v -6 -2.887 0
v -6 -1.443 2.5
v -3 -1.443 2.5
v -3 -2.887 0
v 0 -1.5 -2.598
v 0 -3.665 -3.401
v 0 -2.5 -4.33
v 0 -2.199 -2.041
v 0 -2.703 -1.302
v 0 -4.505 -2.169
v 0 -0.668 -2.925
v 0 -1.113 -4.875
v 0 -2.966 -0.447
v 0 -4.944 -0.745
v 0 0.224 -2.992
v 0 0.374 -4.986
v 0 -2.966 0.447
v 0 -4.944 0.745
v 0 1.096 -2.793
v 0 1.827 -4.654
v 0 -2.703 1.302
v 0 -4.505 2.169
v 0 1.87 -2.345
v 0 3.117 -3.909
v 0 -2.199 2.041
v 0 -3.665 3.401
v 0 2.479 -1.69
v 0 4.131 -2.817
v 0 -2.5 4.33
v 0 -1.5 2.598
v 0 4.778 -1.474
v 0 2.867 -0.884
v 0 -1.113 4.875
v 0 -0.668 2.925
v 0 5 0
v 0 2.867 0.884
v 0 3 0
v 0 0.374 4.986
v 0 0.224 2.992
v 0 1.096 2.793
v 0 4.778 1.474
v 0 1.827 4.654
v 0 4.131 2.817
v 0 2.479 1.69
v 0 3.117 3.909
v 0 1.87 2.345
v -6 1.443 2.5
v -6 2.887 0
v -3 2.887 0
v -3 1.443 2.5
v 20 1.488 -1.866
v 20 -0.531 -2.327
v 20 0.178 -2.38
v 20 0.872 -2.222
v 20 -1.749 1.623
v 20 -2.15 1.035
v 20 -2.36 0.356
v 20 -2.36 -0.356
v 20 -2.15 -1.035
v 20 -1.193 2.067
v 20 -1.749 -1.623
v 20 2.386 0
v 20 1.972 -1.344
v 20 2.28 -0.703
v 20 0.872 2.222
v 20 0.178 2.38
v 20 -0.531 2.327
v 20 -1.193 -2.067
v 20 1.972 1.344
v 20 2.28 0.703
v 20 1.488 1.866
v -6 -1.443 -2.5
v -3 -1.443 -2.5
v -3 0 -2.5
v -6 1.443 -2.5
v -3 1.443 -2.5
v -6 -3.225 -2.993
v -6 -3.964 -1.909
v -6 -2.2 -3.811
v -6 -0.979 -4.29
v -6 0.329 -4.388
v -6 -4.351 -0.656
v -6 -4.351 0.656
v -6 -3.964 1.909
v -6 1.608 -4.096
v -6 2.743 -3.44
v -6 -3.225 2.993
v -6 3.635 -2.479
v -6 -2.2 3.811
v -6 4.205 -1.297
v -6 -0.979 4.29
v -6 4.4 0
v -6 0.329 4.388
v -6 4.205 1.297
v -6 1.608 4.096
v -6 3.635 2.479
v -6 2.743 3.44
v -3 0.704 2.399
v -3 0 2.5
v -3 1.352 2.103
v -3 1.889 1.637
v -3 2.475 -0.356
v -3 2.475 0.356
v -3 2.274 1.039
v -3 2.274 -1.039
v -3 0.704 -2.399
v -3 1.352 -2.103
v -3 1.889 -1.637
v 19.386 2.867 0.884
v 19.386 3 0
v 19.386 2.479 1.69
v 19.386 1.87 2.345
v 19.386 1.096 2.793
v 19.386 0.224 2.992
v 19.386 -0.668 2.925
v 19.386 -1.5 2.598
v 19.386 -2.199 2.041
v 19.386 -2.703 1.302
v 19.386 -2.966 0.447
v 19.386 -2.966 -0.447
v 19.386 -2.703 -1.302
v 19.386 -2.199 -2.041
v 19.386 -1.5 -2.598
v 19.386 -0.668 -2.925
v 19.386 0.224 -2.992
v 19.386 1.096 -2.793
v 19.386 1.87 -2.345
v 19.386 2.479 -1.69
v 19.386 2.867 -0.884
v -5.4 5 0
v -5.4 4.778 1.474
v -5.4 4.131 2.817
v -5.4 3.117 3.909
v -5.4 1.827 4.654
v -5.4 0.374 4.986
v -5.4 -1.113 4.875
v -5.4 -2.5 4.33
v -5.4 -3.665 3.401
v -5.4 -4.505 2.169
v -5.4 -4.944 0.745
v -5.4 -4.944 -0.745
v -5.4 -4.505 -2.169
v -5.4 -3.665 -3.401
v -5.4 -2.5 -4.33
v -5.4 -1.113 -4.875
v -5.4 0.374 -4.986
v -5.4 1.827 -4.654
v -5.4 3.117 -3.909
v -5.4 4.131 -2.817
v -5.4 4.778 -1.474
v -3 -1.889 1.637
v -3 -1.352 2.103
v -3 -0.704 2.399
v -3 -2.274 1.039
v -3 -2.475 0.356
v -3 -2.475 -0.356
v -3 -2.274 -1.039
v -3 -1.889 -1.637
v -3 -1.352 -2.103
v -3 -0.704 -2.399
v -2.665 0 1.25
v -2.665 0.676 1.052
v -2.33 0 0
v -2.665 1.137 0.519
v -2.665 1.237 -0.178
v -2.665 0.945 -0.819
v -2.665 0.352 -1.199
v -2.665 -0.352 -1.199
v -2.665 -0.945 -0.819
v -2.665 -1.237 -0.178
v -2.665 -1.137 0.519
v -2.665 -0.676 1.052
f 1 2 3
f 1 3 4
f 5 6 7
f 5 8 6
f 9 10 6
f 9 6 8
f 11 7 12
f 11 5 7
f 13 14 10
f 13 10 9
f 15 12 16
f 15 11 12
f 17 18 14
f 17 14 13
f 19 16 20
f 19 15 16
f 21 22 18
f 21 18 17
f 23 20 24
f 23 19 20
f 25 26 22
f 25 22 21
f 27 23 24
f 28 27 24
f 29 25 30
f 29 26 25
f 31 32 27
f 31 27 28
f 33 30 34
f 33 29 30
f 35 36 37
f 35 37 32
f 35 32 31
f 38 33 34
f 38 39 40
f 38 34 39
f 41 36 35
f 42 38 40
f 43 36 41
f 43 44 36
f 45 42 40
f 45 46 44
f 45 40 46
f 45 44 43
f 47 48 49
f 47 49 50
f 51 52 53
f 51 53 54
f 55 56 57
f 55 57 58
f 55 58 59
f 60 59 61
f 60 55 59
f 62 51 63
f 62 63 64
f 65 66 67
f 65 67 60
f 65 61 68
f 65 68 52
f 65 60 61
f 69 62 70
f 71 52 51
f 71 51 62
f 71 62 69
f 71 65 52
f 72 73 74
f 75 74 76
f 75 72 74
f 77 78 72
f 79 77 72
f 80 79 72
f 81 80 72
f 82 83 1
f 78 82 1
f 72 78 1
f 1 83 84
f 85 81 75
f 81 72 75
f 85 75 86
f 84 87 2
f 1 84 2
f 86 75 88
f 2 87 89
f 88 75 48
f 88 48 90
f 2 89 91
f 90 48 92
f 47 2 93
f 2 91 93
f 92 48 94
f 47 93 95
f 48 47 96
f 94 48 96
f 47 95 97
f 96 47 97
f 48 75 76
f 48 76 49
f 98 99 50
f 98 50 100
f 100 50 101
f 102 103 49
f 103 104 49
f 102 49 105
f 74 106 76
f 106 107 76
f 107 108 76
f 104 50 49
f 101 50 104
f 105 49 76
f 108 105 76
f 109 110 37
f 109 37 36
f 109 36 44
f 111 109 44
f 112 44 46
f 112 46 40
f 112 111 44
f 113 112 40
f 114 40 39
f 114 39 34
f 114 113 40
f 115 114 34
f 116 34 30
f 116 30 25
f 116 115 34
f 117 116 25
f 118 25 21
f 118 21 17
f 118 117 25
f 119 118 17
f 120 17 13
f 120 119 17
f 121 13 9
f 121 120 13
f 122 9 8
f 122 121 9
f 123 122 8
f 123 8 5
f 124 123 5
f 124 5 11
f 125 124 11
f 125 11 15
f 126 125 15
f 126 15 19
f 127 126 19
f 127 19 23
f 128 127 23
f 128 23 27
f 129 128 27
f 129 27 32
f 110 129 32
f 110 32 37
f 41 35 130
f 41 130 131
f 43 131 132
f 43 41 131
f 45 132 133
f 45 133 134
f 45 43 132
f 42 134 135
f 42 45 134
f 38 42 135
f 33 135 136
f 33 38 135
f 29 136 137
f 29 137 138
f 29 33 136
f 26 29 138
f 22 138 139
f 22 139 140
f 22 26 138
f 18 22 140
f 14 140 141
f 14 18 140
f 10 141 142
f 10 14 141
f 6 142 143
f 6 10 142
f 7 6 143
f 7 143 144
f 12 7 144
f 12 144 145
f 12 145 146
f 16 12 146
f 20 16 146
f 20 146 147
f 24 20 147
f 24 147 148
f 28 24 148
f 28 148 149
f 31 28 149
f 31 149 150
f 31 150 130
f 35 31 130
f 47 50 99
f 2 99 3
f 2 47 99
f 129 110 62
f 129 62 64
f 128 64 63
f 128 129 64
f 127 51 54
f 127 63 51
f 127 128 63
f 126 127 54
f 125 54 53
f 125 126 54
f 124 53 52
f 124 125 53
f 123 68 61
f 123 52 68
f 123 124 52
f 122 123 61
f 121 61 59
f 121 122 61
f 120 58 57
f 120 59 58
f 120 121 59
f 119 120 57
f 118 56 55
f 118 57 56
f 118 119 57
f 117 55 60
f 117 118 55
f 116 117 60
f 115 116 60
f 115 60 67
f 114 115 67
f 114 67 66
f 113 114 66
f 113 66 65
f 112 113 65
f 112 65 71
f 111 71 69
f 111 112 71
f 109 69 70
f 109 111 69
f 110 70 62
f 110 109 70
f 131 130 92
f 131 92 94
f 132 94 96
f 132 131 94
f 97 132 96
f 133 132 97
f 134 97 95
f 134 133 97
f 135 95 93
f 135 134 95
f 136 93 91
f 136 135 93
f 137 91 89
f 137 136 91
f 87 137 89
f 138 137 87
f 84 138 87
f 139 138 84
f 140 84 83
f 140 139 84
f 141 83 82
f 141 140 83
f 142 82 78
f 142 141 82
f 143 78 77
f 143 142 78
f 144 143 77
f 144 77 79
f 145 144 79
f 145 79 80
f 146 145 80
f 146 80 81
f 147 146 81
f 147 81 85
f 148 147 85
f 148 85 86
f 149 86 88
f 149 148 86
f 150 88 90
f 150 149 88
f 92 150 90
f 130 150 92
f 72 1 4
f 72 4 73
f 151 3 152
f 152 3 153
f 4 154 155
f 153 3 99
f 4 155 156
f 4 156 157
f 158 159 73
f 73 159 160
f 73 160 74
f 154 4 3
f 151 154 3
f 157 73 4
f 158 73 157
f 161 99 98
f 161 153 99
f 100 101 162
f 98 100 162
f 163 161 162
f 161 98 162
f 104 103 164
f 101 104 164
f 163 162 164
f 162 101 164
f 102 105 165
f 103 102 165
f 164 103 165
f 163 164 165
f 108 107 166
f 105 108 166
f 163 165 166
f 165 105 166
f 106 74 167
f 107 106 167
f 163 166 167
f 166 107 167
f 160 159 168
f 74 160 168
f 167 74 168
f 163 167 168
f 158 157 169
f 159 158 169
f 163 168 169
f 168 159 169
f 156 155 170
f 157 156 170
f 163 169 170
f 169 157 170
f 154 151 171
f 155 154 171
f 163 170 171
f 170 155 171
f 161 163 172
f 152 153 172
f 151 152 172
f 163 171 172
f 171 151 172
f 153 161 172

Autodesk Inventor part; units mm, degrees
sketch "Sketch_1" plane through (0, 0, 0) normal (0, 0, 1) x (1, 0, 0)
  line L0 (20, 0) -> (-6, 0)
  line L1 (-6, 0) -> (-6, 4.4)
  line L2 (-6, 4.4) -> (-5.4, 5)
  line L3 (-5.4, 5) -> (0, 5)
  line L4 (0, 5) -> (0, 3)
  line L5 (0, 3) -> (19.3865, 3)
  line L6 (19.3865, 3) -> (20, 2.3865)
  line L7 (20, 2.3865) -> (20, 0)
  line L8 (20, 0) -> (-6, 0)
revolve "Revolution1" add sketch "Sketch_1" angle 360 about axis through (20, 0, 0) along (1, 0, 0)
thread "Thread1" size "M6x1" class "6g" standard "ISO Metric profile" length 18.3865
sketch "Sketch2" plane through (-6, 0, 0) normal (-1, 0, 0) x (0, 0, 1)
  point P0 (0, 0)
hole "Hole1" at (-6, 0, 0) direction (1, 0, 0) diameter 5 depth 3 tip angle 150
sketch "Sketch_3" plane through (-6, 0, 0) normal (1, 0, 0) x (0, 0, -1)
  line L0 (-2.5, -1.4434) -> (0, -2.8868)
  line L1 (0, -2.8868) -> (2.5, -1.4434)
  line L2 (2.5, -1.4434) -> (2.5, 1.4434)
  line L3 (2.5, 1.4434) -> (0, 2.8868)
  line L4 (0, 2.8868) -> (-2.5, 1.4434)
  line L5 (-2.5, 1.4434) -> (-2.5, -1.4434)
extrude "Extrusion1" cut sketch "Sketch_3" along normal blind 3
ref_plane "to_cp_XY" through (0, 0, 0) normal (1, 0, 0) x (0, 0, -1)
ref_plane "to_cp_YZ" through (0, 0, 0) normal (0, 0, -1) x (0, 1, 0)
ref_plane "to_cp_ZX" through (0, 0, 0) normal (0, 1, 0) x (1, 0, 0)
properties part number "BOLT6-20"
